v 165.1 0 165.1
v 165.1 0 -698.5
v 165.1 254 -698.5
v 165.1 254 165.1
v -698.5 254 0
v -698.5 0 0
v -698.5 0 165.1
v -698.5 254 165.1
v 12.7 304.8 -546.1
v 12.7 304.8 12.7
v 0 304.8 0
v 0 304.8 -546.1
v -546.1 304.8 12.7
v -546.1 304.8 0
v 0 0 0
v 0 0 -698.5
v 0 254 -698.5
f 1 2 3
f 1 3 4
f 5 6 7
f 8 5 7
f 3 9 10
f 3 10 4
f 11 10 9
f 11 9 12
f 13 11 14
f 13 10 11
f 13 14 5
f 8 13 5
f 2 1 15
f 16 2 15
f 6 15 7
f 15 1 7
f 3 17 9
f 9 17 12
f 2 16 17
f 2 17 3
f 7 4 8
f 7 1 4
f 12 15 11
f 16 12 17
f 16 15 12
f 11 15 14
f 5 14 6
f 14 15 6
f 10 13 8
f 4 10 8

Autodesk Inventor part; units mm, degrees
ref_plane "YZ Plane" through (0, 0, 0) normal (1, 0, 0) x (0, 1, 0)
ref_plane "XZ Plane" through (0, 0, 0) normal (0, 1, 0) x (-1, 0, 0)
ref_plane "XY Plane" through (0, 0, 0) normal (0, 0, 1) x (1, 0, 0)
sketch "Sketch1" plane through (0, 0, 0) normal (0, 1, 0) x (-1, 0, 0)
  line L0 (0, 0) -> (698.5, 0)
  line L1 (0, 0) -> (0, -698.5)
  line L2 (0, -698.5) -> (-165.1, -698.5)
  line L3 (698.5, 0) -> (698.5, 165.1)
  line L4 (-165.1, -698.5) -> (-165.1, 165.1)
  line L5 (-165.1, 165.1) -> (698.5, 165.1)
  dimension "d1" = 698.5
  dimension "d2" = 698.5
  dimension "d3" = 165.1
  dimension "d4" = 165.1
  dimension "d5" = 863.6
  dimension "d6" = 863.6
extrude "Extrusion1" add sketch "Sketch1" along normal blind 304.8
sketch "Sketch2" plane through (-698.5, 0, 0) normal (-1, 0, 0) x (0, 0, 1)
  line L0 (0, 304.8) -> (165.1, 304.8) projected
  line L1 (165.1, 0) -> (165.1, 304.8) projected
  line L2 (12.7, 304.8) -> (165.1, 254)
  line L3 (165.1, 254) -> (165.1, 304.8)
  line L4 (165.1, 304.8) -> (12.7, 304.8)
  point P0 (0, 0)
  dimension "d9" = 12.7
  dimension "d10" = 50.8
sketch3d "3D Sketch1"
  line L0 (-698.5, 304.8, 0) -> (0, 304.8, 0)
  line L1 (0, 304.8, 0) -> (0, 304.8, -698.5)
sweep "Sweep1" cut profiles "Sketch2" path "3D Sketch1"
sketch "Sketch3" plane through (0, 0, 0) normal (0, 0, -1) x (-1, 0, 0)
  line L0 (698.5, 304.8) -> (-12.7, 304.8) projected
  line L1 (698.5, 254) -> (698.5, 304.8) projected
  line L2 (698.5, 0) -> (698.5, 254) projected
  line L3 (546.1, 304.8) -> (698.5, 254)
  line L4 (698.5, 254) -> (698.5, 304.8)
  line L5 (698.5, 304.8) -> (546.1, 304.8)
  point P0 (0, 0)
  dimension "d13" = 152.4
  dimension "d14" = 50.8
extrude "Extrusion2" cut sketch "Sketch3" against normal through all
sketch "Sketch4" plane through (0, 0, -698.5) normal (-1, 0, 0) x (0, 0, 1)
  line L0 (0, 304.8) -> (698.5, 304.8) projected
  line L1 (0, 304.8) -> (0, 254) projected
  line L2 (0, 254) -> (152.4, 304.8)
  line L3 (152.4, 304.8) -> (0, 304.8)
  line L4 (0, 304.8) -> (0, 254)
  point P0 (698.5, 0)
  point P1 (0, 254)
  dimension "d17" = 152.4
  dimension "d18" = 50.8
extrude "Extrusion3" cut sketch "Sketch4" against normal through all
equation "\"d2\" = d1"
equation "\"d4\" = d3"
properties part number "Corner_cap_5" material "Limestone"
